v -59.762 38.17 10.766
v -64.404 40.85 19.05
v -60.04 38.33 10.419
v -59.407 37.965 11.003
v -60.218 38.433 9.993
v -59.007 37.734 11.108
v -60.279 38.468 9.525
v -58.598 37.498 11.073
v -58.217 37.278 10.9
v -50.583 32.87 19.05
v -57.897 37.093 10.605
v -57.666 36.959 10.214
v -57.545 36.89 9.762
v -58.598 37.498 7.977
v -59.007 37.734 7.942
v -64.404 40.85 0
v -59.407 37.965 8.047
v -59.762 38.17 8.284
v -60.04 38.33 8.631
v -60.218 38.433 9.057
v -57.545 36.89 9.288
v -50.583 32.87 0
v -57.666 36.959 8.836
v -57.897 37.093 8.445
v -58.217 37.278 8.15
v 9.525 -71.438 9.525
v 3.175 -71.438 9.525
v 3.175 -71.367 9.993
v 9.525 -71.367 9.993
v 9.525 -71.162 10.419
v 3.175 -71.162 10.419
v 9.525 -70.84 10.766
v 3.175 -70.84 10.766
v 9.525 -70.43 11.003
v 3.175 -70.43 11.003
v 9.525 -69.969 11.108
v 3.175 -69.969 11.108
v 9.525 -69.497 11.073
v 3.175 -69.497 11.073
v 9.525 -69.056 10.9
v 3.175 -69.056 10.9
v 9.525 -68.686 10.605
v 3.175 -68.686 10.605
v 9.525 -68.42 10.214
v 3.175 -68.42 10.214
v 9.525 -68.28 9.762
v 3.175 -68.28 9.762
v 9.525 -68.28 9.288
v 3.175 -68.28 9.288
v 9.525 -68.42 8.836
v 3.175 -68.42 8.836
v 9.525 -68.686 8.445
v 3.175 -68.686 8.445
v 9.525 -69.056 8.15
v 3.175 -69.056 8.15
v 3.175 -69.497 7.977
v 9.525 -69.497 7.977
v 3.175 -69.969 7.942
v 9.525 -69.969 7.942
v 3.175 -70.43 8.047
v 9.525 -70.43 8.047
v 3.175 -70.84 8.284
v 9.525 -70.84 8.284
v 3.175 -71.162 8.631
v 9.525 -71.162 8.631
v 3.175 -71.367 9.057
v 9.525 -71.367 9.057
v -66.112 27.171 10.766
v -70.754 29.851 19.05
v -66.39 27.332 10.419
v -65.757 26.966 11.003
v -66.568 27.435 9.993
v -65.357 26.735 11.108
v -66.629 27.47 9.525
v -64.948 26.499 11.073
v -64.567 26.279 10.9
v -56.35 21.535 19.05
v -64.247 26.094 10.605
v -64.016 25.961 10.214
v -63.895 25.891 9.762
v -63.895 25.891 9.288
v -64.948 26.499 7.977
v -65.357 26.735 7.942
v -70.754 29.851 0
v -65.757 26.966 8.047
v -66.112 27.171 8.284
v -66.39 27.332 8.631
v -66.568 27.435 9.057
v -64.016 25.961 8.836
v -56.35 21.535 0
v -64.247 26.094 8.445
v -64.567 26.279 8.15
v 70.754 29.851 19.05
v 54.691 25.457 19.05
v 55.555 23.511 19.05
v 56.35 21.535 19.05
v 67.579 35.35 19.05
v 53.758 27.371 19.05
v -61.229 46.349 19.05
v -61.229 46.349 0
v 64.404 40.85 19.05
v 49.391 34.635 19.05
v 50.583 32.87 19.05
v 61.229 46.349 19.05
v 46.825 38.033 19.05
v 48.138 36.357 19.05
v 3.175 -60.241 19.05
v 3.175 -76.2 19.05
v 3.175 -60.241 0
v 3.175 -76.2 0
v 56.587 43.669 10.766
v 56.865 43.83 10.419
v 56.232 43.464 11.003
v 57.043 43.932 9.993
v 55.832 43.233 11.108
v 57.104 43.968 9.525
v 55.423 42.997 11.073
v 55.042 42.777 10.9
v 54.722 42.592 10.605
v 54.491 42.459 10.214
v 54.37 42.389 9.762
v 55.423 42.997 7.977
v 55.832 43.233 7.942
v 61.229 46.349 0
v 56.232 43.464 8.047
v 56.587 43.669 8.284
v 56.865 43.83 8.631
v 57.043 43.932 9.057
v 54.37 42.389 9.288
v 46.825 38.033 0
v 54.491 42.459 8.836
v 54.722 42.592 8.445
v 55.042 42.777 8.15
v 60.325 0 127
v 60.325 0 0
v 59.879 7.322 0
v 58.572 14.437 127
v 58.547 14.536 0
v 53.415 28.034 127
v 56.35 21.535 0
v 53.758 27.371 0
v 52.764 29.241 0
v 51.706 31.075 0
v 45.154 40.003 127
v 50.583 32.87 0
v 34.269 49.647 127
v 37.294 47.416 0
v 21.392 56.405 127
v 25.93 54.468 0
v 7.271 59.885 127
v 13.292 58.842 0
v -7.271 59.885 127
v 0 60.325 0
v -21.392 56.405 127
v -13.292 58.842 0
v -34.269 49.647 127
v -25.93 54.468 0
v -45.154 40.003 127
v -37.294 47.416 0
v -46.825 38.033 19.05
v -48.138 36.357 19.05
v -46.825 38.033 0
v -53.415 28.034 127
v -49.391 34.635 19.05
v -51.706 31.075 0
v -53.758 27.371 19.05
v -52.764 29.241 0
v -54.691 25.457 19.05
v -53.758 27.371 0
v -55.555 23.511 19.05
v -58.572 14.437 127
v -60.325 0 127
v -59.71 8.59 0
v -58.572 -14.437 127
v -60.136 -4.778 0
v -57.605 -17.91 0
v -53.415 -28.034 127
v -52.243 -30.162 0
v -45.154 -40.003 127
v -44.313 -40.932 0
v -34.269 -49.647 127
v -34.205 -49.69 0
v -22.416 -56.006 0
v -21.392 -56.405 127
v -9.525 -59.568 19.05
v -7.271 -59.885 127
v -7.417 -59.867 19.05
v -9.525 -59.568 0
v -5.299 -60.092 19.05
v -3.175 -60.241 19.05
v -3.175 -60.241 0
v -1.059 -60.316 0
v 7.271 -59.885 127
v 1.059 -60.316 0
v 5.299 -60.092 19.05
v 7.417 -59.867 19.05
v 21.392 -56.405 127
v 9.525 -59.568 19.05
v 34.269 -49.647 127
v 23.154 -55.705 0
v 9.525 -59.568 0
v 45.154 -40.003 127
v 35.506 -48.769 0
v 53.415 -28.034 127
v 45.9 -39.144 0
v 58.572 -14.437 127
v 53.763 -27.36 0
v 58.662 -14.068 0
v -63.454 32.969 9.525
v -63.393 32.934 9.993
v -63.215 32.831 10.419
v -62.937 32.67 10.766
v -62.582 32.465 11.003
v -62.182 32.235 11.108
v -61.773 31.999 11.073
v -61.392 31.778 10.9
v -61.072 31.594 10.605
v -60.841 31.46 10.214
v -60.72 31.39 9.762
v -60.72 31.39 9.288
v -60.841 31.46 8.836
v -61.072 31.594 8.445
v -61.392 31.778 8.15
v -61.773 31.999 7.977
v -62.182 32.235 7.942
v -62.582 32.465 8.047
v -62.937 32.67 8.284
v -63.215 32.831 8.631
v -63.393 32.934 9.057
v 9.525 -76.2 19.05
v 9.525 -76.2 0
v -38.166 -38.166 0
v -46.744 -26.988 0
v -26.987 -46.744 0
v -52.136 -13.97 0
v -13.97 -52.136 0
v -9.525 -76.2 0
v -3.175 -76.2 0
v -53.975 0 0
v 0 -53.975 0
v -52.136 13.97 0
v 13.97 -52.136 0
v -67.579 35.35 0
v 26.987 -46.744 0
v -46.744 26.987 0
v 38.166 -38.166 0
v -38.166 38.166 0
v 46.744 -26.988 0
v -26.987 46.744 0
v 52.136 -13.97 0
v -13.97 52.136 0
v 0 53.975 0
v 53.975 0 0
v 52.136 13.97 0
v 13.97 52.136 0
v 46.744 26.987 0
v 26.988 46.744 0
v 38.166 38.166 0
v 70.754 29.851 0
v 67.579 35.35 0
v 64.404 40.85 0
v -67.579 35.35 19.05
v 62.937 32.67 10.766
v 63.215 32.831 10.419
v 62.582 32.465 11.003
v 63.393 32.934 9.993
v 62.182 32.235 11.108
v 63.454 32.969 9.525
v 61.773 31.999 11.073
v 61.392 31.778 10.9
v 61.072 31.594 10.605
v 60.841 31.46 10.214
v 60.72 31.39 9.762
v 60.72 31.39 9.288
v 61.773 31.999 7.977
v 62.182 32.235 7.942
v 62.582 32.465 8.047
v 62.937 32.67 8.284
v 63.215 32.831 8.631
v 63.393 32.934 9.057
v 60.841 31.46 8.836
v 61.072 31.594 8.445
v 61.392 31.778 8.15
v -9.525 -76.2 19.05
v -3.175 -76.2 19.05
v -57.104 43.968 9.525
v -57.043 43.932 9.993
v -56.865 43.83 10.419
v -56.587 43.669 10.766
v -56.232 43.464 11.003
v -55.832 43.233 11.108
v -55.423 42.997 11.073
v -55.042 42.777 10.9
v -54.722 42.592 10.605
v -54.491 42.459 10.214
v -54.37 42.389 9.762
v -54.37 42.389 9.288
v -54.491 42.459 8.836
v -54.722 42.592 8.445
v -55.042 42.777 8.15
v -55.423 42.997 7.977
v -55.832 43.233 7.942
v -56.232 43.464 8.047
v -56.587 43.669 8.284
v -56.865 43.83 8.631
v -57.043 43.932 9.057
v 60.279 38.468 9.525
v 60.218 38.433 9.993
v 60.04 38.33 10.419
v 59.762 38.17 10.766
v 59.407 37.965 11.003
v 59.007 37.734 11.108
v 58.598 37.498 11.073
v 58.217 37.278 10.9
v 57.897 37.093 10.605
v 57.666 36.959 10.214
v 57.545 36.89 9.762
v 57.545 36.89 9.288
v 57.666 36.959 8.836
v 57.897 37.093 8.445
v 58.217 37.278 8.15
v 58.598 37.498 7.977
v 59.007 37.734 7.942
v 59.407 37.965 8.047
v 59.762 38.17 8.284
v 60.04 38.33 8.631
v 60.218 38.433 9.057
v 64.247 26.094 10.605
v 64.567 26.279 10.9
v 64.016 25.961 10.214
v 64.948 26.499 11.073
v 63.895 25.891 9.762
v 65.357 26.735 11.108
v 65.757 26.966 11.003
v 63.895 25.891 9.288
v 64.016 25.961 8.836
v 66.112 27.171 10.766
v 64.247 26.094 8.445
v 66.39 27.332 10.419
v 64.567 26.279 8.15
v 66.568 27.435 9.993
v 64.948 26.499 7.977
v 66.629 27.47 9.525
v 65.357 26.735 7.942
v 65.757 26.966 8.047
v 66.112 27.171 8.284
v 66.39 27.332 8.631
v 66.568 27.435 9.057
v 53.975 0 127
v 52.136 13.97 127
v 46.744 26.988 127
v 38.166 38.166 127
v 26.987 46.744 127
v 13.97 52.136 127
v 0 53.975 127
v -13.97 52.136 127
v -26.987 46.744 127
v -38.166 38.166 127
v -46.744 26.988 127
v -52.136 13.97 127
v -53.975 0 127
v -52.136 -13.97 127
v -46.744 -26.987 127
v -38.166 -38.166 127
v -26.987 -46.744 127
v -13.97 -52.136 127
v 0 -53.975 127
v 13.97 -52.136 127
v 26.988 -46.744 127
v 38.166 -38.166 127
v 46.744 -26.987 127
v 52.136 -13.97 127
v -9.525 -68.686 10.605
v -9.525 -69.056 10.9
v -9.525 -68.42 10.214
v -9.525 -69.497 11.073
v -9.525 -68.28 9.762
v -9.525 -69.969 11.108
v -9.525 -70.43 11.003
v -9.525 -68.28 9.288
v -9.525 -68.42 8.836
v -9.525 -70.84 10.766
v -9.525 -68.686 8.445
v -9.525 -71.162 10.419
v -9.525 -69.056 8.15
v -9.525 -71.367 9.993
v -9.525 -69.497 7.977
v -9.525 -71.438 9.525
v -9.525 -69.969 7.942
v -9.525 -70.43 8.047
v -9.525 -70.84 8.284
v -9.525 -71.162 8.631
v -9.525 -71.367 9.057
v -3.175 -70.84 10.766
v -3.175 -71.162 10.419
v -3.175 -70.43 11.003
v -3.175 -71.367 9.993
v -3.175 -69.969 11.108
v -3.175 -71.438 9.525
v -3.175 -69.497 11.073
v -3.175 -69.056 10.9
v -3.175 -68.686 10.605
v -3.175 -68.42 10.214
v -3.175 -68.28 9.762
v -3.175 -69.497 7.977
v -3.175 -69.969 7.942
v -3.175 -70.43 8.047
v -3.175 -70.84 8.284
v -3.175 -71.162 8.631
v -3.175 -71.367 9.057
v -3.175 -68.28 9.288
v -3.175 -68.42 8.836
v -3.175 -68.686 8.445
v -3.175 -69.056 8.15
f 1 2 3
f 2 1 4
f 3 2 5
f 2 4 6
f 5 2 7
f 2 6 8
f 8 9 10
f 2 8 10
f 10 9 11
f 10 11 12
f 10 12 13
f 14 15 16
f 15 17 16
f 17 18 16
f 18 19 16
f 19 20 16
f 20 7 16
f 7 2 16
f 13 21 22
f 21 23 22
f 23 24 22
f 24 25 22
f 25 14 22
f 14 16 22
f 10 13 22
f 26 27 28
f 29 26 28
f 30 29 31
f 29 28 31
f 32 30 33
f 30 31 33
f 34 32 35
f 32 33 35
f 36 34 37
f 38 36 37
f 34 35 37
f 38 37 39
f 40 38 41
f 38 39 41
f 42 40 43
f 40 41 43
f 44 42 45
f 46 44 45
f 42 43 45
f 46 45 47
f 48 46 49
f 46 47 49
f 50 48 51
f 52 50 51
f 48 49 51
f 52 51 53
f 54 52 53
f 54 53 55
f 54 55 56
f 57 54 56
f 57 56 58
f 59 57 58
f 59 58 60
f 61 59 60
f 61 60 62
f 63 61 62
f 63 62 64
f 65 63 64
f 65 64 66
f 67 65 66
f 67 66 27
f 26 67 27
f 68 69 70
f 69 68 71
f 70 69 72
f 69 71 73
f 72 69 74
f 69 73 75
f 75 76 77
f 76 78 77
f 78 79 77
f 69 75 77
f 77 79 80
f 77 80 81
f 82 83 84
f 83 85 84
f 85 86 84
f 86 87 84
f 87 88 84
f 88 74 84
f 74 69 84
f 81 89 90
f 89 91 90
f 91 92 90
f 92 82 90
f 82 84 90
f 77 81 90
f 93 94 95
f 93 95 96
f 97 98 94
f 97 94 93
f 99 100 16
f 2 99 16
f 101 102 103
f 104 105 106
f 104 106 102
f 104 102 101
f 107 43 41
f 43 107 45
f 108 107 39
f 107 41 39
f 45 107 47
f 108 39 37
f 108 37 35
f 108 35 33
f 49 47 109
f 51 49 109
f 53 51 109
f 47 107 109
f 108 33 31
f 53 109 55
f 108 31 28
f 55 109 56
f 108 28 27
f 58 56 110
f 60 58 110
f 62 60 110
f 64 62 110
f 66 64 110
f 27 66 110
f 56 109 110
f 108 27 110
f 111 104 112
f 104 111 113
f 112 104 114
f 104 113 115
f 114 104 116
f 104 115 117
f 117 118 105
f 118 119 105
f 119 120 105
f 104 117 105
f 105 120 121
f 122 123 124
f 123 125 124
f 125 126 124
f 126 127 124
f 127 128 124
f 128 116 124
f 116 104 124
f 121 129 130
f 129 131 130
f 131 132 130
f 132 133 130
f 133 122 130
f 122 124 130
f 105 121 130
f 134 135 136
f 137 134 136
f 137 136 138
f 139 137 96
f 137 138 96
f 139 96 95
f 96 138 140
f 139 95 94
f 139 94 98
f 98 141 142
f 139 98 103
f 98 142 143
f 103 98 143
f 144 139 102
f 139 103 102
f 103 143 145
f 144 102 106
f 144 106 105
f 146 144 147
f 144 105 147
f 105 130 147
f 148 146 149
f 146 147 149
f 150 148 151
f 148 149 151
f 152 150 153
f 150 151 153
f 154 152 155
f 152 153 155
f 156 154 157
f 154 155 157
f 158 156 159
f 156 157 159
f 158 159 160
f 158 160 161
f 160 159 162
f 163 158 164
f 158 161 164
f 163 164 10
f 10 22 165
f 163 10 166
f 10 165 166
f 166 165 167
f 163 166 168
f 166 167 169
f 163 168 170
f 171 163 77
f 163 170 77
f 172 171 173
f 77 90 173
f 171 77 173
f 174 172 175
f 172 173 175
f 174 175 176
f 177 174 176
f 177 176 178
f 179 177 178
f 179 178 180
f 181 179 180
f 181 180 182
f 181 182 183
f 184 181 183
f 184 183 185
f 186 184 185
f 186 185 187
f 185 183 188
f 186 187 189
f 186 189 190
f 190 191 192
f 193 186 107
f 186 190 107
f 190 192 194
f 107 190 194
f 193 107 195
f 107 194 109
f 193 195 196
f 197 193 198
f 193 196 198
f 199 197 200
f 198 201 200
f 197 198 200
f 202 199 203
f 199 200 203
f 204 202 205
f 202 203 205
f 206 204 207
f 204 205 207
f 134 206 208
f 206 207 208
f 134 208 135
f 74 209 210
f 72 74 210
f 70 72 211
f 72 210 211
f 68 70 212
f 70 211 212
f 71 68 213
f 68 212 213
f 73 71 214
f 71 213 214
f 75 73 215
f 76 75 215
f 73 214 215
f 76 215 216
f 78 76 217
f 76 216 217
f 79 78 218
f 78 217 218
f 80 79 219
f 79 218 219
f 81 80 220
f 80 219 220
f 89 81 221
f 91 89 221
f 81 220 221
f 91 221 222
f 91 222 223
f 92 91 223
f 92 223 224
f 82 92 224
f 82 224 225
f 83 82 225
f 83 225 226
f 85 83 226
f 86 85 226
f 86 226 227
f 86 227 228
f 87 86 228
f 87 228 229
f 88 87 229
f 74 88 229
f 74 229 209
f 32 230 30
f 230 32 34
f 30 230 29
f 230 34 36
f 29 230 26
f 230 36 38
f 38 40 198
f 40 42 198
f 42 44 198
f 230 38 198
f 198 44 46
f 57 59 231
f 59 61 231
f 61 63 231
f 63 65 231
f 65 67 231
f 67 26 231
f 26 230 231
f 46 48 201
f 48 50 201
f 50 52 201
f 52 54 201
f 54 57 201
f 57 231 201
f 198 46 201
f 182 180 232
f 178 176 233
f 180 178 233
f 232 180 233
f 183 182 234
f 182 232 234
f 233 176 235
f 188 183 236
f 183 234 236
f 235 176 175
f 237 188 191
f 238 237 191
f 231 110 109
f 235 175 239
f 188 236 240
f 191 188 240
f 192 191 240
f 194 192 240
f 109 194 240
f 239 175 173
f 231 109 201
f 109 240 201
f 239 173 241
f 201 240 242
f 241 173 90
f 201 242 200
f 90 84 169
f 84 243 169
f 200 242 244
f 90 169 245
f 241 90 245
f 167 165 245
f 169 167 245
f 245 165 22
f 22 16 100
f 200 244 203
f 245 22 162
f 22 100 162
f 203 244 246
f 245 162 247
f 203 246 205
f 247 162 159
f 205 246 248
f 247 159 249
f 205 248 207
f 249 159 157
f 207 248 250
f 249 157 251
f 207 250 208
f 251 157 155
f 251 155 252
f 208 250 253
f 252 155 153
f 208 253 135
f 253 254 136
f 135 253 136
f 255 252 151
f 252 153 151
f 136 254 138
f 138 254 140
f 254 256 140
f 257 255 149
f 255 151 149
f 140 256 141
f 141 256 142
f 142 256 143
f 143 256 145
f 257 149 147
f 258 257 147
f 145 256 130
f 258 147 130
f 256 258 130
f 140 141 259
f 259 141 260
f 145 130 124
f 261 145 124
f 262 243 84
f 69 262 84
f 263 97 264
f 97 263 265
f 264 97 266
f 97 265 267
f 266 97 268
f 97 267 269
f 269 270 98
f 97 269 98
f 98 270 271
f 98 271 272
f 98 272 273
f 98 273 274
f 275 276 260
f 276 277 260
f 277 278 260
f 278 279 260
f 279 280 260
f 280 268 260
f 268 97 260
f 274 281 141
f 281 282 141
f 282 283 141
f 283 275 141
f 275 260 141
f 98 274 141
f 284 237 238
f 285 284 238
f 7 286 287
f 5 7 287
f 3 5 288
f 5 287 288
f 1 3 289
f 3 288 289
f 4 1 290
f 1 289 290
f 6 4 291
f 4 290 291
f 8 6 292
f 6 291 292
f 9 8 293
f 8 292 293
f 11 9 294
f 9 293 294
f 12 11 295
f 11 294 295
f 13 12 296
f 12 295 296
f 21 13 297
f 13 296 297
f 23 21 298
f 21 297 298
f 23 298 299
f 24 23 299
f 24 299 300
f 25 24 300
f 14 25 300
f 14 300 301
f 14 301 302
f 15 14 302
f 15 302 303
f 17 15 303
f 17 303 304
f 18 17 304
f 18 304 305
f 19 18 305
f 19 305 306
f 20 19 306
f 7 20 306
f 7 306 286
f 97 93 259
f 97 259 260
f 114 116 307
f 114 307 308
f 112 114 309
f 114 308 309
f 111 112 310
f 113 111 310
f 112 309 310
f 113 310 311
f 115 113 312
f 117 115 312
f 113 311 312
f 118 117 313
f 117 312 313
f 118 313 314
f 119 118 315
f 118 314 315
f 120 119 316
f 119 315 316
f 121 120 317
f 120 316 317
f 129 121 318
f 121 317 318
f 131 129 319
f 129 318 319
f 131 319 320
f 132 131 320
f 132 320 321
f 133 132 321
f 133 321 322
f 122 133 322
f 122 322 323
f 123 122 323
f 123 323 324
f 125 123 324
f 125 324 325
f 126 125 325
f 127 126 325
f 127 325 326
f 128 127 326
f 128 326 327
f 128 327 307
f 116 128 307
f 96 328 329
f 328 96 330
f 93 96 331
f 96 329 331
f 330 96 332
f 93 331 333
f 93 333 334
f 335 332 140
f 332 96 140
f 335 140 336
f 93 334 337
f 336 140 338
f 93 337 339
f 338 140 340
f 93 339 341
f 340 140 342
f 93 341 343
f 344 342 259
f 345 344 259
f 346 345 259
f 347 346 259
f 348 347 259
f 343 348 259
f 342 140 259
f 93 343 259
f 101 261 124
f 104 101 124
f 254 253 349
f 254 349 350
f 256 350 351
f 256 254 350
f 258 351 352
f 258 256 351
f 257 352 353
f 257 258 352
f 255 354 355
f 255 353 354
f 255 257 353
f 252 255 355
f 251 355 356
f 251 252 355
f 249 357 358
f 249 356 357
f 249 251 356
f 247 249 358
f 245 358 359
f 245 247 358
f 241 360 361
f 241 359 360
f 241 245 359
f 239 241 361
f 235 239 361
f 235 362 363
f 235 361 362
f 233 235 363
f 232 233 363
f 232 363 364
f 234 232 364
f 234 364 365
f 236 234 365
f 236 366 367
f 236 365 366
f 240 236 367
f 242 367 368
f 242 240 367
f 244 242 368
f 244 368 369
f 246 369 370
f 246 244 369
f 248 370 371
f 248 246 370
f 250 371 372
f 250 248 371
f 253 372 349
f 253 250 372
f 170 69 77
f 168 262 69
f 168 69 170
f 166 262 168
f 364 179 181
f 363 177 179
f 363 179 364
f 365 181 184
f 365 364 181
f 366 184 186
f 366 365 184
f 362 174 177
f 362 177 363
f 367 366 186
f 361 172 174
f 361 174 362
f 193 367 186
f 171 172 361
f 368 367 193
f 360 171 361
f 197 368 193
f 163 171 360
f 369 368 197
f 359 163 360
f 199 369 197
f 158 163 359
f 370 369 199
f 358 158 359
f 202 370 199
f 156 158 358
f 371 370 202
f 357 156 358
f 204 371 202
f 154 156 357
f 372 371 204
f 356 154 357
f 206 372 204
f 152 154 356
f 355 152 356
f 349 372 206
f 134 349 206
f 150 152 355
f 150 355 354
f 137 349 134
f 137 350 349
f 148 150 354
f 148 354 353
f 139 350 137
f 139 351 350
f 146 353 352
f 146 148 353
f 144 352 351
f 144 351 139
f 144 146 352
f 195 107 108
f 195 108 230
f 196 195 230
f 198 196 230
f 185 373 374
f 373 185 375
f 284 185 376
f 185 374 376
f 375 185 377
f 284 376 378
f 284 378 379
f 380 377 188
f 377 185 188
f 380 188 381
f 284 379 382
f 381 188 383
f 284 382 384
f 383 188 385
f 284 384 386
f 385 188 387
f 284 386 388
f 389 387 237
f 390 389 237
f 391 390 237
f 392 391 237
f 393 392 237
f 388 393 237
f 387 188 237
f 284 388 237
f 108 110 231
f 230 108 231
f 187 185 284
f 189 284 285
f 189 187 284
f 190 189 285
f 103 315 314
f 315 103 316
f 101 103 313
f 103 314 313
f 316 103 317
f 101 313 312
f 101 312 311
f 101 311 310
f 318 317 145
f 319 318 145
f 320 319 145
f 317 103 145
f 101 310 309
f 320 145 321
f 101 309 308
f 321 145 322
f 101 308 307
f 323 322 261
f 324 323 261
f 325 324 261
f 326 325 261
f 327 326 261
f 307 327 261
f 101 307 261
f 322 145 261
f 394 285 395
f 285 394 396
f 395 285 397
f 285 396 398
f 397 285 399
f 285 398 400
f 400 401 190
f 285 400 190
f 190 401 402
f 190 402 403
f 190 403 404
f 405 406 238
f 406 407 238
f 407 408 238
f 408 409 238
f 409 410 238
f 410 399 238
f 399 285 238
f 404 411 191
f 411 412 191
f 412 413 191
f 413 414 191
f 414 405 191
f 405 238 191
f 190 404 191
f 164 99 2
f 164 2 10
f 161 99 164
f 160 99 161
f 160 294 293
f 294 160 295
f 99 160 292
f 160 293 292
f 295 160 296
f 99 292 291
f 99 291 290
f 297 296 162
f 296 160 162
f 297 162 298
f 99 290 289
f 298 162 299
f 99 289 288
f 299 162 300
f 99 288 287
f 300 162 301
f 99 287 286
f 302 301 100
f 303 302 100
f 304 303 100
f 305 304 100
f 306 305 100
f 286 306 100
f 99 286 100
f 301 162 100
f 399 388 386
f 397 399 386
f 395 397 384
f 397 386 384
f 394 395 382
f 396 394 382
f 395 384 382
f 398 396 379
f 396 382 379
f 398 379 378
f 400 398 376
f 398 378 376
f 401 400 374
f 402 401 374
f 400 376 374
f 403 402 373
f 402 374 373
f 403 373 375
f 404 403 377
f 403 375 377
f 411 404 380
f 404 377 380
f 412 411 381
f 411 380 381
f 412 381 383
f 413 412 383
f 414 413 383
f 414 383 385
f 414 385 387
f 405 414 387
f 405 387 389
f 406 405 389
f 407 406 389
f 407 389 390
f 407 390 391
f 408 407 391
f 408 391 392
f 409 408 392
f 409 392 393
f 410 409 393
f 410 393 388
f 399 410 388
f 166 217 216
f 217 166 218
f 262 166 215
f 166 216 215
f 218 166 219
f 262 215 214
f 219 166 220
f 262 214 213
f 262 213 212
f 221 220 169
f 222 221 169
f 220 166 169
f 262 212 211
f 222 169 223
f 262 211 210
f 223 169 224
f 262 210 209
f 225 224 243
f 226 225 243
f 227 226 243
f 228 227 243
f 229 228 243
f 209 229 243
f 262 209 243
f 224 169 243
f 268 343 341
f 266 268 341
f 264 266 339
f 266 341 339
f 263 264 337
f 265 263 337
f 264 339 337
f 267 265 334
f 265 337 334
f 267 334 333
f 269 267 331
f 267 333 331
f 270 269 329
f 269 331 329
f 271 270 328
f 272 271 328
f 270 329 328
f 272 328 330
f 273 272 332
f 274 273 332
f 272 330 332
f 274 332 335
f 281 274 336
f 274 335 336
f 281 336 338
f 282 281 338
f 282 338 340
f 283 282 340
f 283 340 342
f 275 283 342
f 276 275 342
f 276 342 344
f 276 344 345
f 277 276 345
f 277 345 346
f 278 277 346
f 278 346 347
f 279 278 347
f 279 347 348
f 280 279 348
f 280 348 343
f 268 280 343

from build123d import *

# Parameters (mm, degrees)
F1_R      = 60.325
F2_DEPTH  = 127
F0_R      = 53.975
F3_DEPTH  = 184.912
F5_DEPTH  = 19.05
F6_R      = 1.5875
F7_DEPTH  = 25.4
F8_R      = 1.5875
F9_DEPTH  = 25.4
F10_R     = 1.5875
F11_DEPTH = 36.6522


with BuildPart() as f2:
    # F1 (on Top) → F2 (new body)
    with BuildSketch(Plane.XY):
        Circle(F1_R)
    extrude(amount=F2_DEPTH)

    # F0 (on Top) → F3 (cut)
    with BuildSketch(Plane.XY):
        Circle(F0_R)
    extrude(amount=F3_DEPTH, mode=Mode.SUBTRACT)

    # F4 (on Top) → F5 (join)
    with BuildSketch(Plane.XY):
        with BuildLine():
            ThreePointArc((-56.3123252778, 21.5134135298), (-55.0938321912, 24.4657841564), (-53.7206778829, 27.3494736274))
            Line((-53.7206778829, 27.3494736274), (-67.5786357684, 35.350369343))
            Line((-67.5786357684, 35.350369343), (-70.7536357684, 29.851108029))
            Line((-70.7536357684, 29.851108029), (-56.3123252778, 21.5134135298))
        make_face()
        with BuildLine():
            Line((-64.4036357684, 40.849630657), (-50.5456778829, 32.8487349414))
            ThreePointArc((-50.5456778829, 32.8487349414), (-48.7349066985, 35.4797661912), (-46.7873252778, 38.0111974719))
            Line((-46.7873252778, 38.0111974719), (-61.2286357684, 46.348891971))
            Line((-61.2286357684, 46.348891971), (-64.4036357684, 40.849630657))
        make_face()
        with BuildLine():
            Line((67.5786357684, 35.350369343), (53.7206778829, 27.3494736274))
            ThreePointArc((53.7206778829, 27.3494736274), (55.0938321912, 24.4657841564), (56.3123252778, 21.5134135298))
            Line((56.3123252778, 21.5134135298), (70.7536357684, 29.851108029))
            Line((70.7536357684, 29.851108029), (67.5786357684, 35.350369343))
        make_face()
        with BuildLine():
            ThreePointArc((46.7873252778, 38.0111974719), (48.7349066985, 35.4797661912), (50.5456778829, 32.8487349414))
            Line((50.5456778829, 32.8487349414), (64.4036357684, 40.849630657))
            Line((64.4036357684, 40.849630657), (61.2286357684, 46.348891971))
            Line((61.2286357684, 46.348891971), (46.7873252778, 38.0111974719))
        make_face()
        with BuildLine():
            Line((-3.175, -76.2), (-3.175, -60.1982085688))
            ThreePointArc((-3.175, -60.1982085688), (-6.3589254926, -59.9455503476), (-9.525, -59.5246110016))
            Line((-9.525, -59.5246110016), (-9.525, -76.2))
            Line((-9.525, -76.2), (-3.175, -76.2))
        make_face()
        with BuildLine():
            ThreePointArc((9.525, -59.5246110016), (6.3589254926, -59.9455503476), (3.175, -60.1982085688))
            Line((3.175, -60.1982085688), (3.175, -76.2))
            Line((3.175, -76.2), (9.525, -76.2))
            Line((9.525, -76.2), (9.525, -59.5246110016))
        make_face()
    extrude(amount=F5_DEPTH)

    # F6 (on face) → F7 (cut)
    with BuildSketch(Plane(origin=(4.7625, 8.248891971, 0), x_dir=(-0.8660254038, 0.5, 0), z_dir=(0.5, 0.8660254038, 0))):
        with Locations((69.85, 9.525)):
            Circle(F6_R)
    extrude(amount=-F7_DEPTH, mode=Mode.SUBTRACT)

    # F8 (on face) → F9 (cut)
    with BuildSketch(Plane(origin=(4.7625, -8.248891971, 0), x_dir=(0.8660254038, 0.5, 0), z_dir=(0.5, -0.8660254038, 0))):
        with Locations((69.85, 9.525)):
            Circle(F8_R)
    extrude(amount=-F9_DEPTH, mode=Mode.SUBTRACT)

    # F10 (on face) → F11 (cut)
    with BuildSketch(Plane(origin=(-9.525, 0, 0), x_dir=(0, -1, 0), z_dir=(-1, 0, 0))):
        with Locations((69.85, 9.525)):
            Circle(F10_R)
    extrude(amount=-F11_DEPTH, mode=Mode.SUBTRACT)


solid = f2.part
